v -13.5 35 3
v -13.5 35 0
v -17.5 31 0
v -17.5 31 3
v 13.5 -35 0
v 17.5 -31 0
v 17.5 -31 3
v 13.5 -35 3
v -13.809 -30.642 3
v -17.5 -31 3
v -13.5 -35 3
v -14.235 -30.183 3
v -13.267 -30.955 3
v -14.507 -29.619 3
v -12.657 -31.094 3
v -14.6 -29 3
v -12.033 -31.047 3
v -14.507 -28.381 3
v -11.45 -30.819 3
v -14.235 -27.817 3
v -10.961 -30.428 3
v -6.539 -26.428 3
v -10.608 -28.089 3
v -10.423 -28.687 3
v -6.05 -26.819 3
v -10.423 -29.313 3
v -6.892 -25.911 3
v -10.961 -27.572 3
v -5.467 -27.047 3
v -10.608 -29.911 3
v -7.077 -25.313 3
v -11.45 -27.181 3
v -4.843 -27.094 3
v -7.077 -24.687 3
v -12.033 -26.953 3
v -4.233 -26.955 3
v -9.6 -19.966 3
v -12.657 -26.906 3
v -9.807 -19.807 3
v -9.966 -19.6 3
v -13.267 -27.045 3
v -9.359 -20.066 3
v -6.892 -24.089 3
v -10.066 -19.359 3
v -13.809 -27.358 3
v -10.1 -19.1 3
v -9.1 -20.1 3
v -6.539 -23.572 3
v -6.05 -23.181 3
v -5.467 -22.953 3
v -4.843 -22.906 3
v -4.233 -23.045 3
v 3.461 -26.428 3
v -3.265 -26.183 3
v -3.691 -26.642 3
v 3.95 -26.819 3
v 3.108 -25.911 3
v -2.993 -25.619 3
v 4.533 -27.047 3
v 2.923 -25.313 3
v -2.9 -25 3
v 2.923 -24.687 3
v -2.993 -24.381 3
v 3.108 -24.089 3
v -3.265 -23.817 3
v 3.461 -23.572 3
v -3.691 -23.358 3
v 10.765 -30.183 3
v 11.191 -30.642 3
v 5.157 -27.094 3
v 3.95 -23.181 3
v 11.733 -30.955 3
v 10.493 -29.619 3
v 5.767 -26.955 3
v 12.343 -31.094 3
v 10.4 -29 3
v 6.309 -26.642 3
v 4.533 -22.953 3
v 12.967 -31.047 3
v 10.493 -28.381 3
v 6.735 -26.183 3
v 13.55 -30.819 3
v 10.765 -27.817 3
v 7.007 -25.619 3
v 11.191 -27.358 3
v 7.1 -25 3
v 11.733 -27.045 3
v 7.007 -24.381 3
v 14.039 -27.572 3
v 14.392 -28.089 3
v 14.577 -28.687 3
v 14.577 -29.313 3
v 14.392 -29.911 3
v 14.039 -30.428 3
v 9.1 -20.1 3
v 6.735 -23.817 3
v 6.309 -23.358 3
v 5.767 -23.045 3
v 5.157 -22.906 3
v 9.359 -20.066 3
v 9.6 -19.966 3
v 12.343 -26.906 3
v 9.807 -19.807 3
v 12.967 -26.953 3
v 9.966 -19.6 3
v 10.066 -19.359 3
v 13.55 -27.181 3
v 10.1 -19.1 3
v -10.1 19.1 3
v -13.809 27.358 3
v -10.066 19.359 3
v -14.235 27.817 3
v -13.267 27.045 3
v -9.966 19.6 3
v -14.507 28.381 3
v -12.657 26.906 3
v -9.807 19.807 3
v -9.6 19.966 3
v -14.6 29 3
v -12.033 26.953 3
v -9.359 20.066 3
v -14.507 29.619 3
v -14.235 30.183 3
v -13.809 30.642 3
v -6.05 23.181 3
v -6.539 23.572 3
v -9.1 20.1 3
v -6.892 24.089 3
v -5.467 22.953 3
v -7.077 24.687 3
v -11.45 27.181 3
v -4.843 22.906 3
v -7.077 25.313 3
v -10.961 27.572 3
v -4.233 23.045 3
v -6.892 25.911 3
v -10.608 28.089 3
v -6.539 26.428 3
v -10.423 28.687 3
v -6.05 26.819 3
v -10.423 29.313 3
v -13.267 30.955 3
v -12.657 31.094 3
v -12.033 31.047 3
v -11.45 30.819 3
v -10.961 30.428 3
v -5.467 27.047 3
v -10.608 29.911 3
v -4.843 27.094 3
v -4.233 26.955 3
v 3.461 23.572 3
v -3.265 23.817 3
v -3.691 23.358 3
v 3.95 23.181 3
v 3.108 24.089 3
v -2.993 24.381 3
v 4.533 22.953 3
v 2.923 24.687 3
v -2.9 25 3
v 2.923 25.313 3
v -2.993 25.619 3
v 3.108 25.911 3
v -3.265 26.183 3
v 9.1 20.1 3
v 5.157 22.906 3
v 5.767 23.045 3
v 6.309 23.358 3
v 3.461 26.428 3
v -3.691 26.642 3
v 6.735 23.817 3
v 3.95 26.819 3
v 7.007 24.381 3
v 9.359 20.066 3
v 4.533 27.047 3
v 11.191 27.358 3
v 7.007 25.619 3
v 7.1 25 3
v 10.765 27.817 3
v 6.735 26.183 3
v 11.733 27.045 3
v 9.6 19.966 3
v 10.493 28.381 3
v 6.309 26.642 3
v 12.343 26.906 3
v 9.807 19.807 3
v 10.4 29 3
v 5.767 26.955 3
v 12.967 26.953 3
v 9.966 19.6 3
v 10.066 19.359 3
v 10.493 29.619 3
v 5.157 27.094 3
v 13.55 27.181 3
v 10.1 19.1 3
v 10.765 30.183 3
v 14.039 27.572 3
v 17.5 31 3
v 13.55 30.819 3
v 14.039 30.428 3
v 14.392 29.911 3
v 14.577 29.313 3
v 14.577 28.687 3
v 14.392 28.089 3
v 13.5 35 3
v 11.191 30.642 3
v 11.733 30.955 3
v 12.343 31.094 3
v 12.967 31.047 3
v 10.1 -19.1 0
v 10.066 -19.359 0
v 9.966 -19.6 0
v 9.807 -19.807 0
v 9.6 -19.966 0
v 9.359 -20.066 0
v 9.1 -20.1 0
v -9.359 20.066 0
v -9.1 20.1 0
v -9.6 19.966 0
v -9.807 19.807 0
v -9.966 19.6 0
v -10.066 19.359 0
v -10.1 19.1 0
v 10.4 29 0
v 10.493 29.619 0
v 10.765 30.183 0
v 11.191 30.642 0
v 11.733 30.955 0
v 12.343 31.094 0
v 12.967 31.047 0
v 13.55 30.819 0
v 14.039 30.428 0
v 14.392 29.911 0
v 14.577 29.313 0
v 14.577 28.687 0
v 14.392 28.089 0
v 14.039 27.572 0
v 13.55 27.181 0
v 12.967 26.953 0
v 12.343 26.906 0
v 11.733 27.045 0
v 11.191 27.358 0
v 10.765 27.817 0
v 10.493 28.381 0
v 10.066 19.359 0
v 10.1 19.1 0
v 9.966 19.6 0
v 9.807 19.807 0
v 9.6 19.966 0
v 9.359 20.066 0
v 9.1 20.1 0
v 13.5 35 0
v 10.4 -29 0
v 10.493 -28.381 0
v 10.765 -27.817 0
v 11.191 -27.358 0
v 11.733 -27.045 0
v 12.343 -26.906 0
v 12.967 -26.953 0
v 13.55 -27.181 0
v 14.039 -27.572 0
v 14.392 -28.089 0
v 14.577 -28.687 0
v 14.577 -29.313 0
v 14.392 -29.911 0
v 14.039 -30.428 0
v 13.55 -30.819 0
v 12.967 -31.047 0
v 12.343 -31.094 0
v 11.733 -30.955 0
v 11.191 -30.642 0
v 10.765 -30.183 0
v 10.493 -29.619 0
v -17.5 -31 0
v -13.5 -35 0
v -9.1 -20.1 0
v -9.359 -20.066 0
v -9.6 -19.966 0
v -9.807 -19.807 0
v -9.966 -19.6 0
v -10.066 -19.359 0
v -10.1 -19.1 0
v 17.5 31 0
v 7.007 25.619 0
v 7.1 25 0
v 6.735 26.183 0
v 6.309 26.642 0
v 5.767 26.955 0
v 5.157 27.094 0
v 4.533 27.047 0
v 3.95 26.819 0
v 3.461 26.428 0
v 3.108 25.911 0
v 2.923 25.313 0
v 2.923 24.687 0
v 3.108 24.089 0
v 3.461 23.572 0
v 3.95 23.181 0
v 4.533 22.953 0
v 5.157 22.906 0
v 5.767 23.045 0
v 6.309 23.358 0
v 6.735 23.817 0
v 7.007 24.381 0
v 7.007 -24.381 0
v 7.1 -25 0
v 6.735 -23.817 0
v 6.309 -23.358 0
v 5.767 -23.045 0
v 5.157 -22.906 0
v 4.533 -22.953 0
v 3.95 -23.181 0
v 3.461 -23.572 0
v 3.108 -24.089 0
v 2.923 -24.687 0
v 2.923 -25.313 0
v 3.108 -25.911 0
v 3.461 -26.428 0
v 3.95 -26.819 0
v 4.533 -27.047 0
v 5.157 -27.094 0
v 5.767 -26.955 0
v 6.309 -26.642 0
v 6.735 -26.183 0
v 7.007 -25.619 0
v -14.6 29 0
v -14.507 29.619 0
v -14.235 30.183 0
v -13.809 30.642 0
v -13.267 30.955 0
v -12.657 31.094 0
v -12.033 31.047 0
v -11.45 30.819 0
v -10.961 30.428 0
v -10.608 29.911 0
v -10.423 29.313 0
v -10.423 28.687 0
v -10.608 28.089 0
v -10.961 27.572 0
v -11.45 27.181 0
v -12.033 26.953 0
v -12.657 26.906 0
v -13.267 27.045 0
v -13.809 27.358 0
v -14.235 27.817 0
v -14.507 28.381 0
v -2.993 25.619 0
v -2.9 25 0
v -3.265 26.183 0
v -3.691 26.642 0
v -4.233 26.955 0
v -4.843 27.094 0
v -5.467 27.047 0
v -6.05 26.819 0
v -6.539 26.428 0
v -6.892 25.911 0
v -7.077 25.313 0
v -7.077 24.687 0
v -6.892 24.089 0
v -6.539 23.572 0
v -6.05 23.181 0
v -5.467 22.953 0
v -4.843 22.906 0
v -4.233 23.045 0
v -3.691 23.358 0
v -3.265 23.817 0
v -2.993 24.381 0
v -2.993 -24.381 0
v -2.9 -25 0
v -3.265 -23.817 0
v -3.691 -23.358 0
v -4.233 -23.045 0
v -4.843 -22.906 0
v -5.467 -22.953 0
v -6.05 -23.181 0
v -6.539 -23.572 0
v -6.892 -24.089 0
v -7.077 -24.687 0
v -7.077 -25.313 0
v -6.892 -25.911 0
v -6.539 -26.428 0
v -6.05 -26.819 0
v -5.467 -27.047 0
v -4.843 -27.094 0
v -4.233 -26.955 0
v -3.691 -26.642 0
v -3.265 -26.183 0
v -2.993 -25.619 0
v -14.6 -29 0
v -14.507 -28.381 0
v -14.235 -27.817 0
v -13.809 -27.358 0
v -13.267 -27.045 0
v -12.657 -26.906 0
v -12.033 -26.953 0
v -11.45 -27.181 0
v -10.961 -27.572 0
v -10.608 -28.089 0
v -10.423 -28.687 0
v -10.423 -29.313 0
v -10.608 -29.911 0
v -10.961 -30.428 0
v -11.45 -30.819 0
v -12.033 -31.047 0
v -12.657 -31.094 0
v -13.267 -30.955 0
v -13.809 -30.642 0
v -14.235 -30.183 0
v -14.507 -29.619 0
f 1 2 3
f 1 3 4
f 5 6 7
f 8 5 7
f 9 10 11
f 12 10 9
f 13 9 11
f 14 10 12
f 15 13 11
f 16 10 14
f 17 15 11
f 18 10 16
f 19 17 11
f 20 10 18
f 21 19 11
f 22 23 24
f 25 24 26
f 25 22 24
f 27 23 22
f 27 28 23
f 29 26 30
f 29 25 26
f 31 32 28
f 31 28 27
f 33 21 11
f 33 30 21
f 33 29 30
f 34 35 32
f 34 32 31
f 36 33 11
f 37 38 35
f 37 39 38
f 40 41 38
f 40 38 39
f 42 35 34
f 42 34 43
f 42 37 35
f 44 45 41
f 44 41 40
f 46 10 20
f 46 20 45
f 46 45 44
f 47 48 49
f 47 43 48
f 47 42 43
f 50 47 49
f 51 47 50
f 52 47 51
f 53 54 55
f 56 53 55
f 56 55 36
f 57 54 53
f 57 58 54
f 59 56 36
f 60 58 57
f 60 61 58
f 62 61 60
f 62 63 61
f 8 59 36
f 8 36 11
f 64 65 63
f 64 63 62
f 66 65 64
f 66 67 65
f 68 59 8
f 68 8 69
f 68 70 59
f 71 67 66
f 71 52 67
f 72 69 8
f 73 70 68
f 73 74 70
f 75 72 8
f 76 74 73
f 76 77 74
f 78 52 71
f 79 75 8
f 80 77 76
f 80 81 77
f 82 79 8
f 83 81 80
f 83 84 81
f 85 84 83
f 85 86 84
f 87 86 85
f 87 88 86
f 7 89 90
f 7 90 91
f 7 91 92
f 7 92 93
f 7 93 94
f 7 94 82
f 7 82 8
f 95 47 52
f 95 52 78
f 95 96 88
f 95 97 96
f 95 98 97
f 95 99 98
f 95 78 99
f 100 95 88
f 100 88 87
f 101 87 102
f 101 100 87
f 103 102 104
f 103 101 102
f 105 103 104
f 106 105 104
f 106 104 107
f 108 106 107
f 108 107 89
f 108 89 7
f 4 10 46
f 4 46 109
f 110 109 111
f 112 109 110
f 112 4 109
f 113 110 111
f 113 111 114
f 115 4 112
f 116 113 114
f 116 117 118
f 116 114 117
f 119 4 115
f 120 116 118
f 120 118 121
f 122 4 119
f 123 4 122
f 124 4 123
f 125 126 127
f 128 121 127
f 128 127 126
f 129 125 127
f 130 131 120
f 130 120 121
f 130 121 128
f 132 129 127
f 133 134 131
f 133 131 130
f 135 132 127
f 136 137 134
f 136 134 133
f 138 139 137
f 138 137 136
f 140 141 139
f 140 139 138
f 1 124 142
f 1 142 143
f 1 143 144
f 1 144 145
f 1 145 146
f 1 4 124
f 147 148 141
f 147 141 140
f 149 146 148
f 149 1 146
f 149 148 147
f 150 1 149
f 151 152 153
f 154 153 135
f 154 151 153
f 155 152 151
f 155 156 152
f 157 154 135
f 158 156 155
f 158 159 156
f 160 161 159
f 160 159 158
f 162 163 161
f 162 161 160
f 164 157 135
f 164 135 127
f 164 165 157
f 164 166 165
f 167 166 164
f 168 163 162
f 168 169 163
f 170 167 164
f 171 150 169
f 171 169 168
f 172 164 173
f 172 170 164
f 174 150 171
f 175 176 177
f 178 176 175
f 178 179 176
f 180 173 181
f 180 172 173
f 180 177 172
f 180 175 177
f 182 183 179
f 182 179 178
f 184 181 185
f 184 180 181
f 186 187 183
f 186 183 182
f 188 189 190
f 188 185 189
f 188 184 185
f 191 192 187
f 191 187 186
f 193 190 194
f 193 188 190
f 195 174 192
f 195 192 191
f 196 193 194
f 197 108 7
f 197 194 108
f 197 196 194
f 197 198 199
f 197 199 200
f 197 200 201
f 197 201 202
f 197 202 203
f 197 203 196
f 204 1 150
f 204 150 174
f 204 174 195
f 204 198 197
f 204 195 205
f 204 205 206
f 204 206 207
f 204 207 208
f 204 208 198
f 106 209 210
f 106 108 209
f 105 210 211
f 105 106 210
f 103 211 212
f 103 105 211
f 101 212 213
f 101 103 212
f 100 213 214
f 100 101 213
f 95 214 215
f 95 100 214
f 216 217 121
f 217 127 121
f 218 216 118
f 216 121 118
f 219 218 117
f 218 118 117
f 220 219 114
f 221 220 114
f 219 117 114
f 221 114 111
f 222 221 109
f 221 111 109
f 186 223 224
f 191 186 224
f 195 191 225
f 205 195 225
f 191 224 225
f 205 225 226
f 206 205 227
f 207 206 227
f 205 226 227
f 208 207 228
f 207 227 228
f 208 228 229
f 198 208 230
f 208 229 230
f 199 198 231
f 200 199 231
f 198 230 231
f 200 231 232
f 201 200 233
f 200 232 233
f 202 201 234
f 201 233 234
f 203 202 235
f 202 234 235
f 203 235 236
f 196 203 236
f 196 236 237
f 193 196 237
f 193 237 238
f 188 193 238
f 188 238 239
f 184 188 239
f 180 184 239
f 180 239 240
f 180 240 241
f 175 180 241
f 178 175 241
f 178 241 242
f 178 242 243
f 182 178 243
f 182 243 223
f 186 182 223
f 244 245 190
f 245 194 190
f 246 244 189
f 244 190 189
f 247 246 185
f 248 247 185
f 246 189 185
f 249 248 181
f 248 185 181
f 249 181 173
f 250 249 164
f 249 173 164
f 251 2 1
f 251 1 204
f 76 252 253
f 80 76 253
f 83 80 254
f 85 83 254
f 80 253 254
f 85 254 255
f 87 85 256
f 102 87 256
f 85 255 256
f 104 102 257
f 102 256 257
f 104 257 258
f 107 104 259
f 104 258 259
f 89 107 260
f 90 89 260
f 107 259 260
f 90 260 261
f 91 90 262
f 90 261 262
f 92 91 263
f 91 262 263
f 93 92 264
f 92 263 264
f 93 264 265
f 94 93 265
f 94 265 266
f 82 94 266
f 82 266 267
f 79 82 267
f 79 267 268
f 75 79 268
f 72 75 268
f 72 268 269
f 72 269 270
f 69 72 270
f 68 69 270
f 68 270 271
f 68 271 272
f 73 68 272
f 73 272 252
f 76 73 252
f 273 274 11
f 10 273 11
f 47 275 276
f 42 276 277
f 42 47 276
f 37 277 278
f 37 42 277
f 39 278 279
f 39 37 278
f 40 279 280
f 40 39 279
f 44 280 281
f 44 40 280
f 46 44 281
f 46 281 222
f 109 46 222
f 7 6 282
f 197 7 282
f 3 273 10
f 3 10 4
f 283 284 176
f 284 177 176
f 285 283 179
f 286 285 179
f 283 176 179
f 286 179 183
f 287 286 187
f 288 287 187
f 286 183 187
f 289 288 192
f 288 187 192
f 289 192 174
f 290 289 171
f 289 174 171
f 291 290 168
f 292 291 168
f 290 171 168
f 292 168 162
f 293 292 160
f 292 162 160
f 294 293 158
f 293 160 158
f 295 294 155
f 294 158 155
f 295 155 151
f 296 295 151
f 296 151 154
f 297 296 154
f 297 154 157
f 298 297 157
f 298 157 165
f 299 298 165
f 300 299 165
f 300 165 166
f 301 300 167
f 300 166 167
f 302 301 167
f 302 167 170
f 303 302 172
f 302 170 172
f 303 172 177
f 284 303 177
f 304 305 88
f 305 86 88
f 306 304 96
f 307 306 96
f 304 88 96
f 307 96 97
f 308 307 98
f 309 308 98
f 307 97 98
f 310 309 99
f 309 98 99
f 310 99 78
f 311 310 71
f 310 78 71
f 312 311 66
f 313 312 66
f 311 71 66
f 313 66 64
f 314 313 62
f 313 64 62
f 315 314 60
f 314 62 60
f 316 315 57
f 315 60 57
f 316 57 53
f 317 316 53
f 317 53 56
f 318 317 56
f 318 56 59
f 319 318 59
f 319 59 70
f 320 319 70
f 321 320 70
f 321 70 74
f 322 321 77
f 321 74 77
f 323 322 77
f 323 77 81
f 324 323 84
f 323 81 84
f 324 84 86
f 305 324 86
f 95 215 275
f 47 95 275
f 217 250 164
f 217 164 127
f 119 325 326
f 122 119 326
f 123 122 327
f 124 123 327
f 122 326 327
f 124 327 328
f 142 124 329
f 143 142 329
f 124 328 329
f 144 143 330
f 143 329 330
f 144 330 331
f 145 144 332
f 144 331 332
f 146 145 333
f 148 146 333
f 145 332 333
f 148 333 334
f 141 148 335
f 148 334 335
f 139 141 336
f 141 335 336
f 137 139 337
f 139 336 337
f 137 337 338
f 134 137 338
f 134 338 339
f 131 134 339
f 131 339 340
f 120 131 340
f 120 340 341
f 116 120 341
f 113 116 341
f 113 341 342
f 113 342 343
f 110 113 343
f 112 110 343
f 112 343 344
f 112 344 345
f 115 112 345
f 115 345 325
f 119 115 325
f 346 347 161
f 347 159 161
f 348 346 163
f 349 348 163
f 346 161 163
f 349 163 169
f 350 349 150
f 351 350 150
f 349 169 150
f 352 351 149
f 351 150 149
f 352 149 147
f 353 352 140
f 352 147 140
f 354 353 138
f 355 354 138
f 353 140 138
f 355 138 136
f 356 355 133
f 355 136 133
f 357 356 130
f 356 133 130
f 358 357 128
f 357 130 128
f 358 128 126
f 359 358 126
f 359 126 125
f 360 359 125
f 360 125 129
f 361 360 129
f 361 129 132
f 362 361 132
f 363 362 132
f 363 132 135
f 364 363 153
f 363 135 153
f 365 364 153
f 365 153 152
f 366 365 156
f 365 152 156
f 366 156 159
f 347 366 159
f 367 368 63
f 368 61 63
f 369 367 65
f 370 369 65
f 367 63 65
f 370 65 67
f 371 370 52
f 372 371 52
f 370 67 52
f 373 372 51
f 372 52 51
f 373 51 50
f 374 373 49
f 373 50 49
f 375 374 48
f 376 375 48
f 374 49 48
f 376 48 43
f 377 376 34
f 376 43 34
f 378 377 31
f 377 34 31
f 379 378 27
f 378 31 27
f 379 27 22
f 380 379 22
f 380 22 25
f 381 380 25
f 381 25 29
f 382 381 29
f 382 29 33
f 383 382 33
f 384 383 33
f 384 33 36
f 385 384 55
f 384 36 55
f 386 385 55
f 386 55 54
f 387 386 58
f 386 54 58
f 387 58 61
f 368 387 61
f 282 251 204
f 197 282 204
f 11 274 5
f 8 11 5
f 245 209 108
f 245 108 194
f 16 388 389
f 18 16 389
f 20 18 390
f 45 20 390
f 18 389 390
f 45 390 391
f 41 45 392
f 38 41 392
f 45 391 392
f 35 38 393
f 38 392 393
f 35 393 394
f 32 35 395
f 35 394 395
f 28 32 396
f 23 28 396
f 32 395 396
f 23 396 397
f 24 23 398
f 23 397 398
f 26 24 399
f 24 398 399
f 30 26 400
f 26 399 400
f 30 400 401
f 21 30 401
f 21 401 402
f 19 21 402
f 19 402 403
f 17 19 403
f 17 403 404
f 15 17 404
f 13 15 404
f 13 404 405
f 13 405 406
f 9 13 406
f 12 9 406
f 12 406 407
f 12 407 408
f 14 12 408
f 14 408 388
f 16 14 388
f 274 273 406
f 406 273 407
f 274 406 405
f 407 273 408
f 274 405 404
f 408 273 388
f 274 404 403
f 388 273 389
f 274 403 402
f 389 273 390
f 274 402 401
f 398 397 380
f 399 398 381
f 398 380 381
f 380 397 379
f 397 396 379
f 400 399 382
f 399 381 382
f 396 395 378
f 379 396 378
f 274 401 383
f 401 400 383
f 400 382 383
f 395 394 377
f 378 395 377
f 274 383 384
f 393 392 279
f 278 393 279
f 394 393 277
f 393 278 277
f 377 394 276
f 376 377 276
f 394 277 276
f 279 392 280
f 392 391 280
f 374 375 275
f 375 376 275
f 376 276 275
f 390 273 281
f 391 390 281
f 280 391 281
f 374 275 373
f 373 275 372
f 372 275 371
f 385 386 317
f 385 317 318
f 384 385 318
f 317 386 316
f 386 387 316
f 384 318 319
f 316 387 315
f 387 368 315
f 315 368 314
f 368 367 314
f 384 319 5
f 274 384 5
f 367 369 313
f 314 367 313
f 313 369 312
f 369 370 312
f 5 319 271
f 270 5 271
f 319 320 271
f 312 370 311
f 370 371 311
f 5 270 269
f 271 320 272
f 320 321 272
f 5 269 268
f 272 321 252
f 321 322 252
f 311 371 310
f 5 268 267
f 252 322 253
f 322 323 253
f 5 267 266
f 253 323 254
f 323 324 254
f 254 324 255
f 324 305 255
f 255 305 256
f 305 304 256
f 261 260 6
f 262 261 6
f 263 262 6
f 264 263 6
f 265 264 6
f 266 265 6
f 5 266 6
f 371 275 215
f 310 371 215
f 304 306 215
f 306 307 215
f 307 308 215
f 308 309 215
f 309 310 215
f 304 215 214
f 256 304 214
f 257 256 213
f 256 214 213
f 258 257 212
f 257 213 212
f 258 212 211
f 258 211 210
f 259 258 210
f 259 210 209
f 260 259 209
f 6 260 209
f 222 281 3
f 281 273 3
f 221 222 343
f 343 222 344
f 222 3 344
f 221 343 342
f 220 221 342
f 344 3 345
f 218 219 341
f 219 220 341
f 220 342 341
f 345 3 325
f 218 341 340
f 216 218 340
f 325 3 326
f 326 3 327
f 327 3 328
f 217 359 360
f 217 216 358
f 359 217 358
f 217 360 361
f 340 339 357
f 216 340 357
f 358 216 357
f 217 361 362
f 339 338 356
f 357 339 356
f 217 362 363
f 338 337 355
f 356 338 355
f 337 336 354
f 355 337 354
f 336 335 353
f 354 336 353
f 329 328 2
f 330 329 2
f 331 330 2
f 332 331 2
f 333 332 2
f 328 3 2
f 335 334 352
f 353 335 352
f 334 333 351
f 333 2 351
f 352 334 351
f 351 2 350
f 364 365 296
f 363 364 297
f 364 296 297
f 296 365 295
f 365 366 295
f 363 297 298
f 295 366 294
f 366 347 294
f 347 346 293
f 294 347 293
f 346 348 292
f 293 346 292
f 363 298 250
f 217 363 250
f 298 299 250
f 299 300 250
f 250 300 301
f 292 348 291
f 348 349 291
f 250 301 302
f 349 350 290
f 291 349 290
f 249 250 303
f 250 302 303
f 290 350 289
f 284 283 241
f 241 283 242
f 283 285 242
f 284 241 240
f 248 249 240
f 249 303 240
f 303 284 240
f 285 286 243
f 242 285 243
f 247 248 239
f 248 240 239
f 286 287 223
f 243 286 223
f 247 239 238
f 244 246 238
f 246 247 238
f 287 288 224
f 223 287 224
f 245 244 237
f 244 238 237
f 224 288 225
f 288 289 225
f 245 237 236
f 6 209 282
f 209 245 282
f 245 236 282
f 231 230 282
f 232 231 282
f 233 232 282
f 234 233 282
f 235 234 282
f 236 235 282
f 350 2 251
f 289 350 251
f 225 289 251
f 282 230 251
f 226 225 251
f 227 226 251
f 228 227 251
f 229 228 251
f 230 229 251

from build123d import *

# Parameters (mm, degrees)
SKETCH_1_W                  = 35
SKETCH_1_H                  = 70
EXTRUDE_1_DEPTH             = 3
CHAMFER_1_SIZE              = 4
SKETCH_2_W                  = 20.2
SKETCH_2_H                  = 40.2
CUT_EXTRUDE_1_DEPTH         = 40.246018906
SKETCH_4_R                  = 2.1
CUT_EXTRUDE_3_DEPTH         = 40.246018906
PATTERN_LINEAR_2_COUNT      = 2
PATTERN_LINEAR_2_PITCH      = 25
PATTERN_LINEAR_2_COUNT_DIR2 = 2
PATTERN_LINEAR_2_PITCH_DIR2 = 58
SKETCH_5_R                  = 2.1
CUT_EXTRUDE_4_DEPTH         = 40.246018906
PATTERN_LINEAR_3_COUNT      = 2
PATTERN_LINEAR_3_PITCH      = 10
PATTERN_LINEAR_3_COUNT_DIR2 = 2
PATTERN_LINEAR_3_PITCH_DIR2 = 50
FILLET_1_R                  = 1


with BuildPart() as part:
    # 草圖1 → 填料-伸長1 (new body)
    with BuildSketch(Plane.XY):
        Rectangle(SKETCH_1_W, SKETCH_1_H)
    extrude(amount=EXTRUDE_1_DEPTH)

    # 導角1
    chamfer_1_edges = [part.edges().sort_by_distance(p)[0] for p in [
        (17.5, -35, 1.5),
        (-17.5, -35, 1.5),
        (-17.5, 35, 1.5),
        (17.5, 35, 1.5),
    ]]
    chamfer(chamfer_1_edges, length=CHAMFER_1_SIZE)

    # 草圖2 → 除料-伸長1 (cut, through all)
    with BuildSketch(Plane(origin=(0, 0, 0), x_dir=(-1, 0, 0), z_dir=(0, 0, -1))):
        Rectangle(SKETCH_2_W, SKETCH_2_H)
    extrude(amount=-CUT_EXTRUDE_1_DEPTH, mode=Mode.SUBTRACT)

    # 草圖4 → 除料-伸長3 (cut, through all)
    with BuildSketch(Plane(origin=(0, 0, 0), x_dir=(-1, 0, 0), z_dir=(0, 0, -1))):
        with Locations((-12.5, 29)):
            Circle(SKETCH_4_R)
    cut_extrude_3 = extrude(amount=-CUT_EXTRUDE_3_DEPTH, mode=Mode.SUBTRACT)

    # 直線複製排列2: Cut-Extrude 3 2 × 2
    with Locations(*[(-i * PATTERN_LINEAR_2_PITCH, -j * PATTERN_LINEAR_2_PITCH_DIR2, 0) for i in range(PATTERN_LINEAR_2_COUNT) for j in range(PATTERN_LINEAR_2_COUNT_DIR2) if (i, j) != (0, 0)]):
        add(cut_extrude_3, mode=Mode.SUBTRACT)

    # 草圖5 → 除料-伸長4 (cut, symmetric)
    with BuildSketch(Plane.XY.offset(3)):
        with Locations((-5, -25)):
            Circle(SKETCH_5_R)
    cut_extrude_4 = extrude(amount=CUT_EXTRUDE_4_DEPTH, both=True, mode=Mode.SUBTRACT)

    # 直線複製排列3: Cut-Extrude 4 2 × 2
    with Locations(*[(i * PATTERN_LINEAR_3_PITCH, j * PATTERN_LINEAR_3_PITCH_DIR2, 0) for i in range(PATTERN_LINEAR_3_COUNT) for j in range(PATTERN_LINEAR_3_COUNT_DIR2) if (i, j) != (0, 0)]):
        add(cut_extrude_4, mode=Mode.SUBTRACT)

    # 圓角1
    fillet_1_edges = [part.edges().sort_by_distance(p)[0] for p in [
        (-10.1, 20.1, 1.5),
        (-10.1, -20.1, 1.5),
        (10.1, -20.1, 1.5),
        (10.1, 20.1, 1.5),
    ]]
    fillet(fillet_1_edges, radius=FILLET_1_R)


solid = part.part
